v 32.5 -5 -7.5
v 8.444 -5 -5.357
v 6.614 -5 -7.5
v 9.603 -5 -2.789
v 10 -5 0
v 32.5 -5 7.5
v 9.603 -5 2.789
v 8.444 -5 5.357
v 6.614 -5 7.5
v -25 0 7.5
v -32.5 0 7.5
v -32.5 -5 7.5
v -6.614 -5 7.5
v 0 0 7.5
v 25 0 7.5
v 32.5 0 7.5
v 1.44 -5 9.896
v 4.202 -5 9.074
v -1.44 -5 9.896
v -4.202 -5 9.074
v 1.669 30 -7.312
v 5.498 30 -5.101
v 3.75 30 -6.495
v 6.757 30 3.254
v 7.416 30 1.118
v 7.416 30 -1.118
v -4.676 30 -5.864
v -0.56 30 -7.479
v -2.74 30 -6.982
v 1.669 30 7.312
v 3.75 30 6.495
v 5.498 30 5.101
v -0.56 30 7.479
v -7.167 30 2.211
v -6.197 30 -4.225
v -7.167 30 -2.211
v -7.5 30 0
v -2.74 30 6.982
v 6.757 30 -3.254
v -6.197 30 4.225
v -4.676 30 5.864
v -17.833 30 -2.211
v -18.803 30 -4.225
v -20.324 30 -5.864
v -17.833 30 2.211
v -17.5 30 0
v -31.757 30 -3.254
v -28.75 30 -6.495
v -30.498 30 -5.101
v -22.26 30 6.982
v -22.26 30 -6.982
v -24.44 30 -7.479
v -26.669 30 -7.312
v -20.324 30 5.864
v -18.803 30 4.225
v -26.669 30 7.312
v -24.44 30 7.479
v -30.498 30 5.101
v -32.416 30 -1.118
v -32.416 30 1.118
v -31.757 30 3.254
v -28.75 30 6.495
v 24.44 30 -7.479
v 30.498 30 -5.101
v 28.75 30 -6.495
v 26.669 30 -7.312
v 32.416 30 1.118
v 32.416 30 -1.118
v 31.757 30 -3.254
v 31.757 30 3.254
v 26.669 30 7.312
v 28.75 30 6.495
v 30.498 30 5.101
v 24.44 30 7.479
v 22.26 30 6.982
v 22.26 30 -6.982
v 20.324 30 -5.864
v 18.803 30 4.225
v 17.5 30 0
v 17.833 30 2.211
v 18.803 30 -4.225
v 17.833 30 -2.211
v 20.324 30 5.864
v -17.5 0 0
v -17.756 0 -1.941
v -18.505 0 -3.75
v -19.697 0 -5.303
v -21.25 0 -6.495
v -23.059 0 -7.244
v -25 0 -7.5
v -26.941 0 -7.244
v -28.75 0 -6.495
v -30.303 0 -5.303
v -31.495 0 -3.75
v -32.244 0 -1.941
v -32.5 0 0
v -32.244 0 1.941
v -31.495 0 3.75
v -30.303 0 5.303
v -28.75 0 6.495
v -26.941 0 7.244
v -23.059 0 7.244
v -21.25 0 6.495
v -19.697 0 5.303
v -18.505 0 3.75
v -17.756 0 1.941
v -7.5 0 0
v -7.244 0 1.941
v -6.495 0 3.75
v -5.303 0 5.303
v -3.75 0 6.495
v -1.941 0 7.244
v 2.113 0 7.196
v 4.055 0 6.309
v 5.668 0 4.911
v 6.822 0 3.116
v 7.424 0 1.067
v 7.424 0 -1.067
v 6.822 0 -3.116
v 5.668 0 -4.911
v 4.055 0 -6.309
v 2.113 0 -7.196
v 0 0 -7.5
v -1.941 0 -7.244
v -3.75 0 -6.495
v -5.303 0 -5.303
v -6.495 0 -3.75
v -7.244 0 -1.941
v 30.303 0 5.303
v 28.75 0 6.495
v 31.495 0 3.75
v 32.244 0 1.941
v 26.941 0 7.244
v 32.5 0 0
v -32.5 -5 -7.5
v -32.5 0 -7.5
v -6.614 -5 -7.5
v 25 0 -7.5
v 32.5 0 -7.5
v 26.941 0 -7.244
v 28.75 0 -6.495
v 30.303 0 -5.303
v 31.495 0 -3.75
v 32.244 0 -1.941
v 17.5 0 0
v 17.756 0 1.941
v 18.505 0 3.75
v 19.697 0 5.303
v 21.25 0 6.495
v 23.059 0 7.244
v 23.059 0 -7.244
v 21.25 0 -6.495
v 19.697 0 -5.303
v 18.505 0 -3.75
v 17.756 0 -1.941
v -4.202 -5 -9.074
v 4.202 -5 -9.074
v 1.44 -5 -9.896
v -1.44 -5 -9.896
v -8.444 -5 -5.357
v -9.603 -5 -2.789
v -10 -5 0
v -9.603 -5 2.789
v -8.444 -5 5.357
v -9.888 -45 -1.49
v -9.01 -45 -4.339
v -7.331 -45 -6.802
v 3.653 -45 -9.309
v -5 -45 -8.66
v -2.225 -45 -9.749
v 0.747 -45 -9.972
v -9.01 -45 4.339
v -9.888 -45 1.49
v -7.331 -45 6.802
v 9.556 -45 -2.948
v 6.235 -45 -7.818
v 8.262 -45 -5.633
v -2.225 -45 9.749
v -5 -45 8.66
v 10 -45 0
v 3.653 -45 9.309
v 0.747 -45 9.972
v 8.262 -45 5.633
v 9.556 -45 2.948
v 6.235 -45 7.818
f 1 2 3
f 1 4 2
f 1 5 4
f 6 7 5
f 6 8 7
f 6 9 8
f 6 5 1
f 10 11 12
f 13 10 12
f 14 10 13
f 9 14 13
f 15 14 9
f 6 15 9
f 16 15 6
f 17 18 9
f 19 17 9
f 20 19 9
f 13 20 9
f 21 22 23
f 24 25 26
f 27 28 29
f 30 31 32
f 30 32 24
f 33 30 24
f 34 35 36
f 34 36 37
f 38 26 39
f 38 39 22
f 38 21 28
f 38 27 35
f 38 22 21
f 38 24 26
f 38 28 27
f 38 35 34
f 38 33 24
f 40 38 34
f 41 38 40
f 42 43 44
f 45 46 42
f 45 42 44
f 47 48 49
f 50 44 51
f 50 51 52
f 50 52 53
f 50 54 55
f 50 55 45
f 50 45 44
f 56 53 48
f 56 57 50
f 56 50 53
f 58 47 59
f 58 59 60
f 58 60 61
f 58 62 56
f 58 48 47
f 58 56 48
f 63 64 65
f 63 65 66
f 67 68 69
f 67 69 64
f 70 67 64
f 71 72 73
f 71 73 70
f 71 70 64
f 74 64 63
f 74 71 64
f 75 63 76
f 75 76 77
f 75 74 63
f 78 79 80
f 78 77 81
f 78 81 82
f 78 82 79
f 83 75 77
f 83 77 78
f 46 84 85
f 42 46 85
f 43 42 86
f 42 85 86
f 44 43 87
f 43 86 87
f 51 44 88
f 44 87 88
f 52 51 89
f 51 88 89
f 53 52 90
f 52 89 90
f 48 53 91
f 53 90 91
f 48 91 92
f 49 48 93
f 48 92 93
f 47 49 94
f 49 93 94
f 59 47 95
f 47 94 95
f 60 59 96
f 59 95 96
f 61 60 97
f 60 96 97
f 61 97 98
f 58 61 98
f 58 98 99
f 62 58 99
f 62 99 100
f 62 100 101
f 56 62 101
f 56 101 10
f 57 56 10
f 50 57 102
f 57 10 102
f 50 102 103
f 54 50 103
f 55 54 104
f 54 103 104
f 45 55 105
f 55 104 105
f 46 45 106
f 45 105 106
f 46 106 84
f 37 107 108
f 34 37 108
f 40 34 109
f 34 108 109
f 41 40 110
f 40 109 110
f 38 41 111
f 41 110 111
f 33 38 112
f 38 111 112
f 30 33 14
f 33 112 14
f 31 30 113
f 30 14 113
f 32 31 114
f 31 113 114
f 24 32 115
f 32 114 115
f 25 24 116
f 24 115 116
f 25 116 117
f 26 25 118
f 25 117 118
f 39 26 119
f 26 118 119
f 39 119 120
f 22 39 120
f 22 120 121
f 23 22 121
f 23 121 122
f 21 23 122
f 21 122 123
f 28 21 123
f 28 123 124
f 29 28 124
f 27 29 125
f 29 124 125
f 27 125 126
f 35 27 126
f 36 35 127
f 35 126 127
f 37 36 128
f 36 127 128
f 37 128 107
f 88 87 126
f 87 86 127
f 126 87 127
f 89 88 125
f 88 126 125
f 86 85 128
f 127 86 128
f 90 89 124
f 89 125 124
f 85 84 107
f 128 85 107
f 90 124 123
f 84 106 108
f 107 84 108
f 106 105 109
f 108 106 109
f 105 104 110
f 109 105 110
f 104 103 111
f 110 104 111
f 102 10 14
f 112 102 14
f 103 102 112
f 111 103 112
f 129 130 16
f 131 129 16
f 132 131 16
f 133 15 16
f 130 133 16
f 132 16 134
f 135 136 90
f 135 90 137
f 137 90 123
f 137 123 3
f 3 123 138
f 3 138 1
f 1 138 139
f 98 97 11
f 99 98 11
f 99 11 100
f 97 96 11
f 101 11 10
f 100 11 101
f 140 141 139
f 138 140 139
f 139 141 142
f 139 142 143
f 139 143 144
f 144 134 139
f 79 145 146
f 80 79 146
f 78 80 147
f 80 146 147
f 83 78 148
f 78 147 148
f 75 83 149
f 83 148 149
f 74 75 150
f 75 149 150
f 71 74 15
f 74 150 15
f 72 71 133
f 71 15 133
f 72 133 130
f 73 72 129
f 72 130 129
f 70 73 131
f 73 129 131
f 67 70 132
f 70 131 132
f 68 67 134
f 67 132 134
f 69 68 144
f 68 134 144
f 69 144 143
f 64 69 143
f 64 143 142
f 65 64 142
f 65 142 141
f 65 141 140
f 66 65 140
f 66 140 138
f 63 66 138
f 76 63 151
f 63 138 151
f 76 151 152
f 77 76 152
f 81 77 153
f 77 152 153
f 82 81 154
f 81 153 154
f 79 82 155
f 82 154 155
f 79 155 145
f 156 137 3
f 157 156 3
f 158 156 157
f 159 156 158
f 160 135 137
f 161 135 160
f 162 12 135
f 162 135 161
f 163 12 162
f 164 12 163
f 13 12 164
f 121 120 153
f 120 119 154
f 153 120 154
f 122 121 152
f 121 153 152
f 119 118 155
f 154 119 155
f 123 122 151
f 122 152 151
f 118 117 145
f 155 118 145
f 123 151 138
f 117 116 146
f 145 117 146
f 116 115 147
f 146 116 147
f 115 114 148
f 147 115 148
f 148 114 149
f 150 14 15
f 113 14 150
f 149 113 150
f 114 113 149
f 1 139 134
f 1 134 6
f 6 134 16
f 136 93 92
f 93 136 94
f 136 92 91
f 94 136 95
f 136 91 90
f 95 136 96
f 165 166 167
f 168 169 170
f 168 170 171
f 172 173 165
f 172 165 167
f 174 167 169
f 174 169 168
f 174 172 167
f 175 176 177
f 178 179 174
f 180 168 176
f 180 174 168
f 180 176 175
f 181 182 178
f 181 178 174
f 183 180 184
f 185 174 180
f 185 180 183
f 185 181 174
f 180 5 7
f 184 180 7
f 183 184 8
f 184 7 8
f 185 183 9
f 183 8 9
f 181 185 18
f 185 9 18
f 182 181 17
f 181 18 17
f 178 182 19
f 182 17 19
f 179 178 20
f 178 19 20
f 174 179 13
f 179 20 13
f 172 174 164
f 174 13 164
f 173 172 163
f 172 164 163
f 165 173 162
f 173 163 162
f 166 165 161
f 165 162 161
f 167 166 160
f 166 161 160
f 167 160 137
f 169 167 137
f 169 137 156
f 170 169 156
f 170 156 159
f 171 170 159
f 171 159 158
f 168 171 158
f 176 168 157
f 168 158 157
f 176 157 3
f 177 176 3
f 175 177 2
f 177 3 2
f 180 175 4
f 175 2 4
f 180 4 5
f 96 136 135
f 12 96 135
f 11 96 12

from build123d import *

# Parameters (mm, degrees)
F0_W     = 65
F0_H     = 15
F1_DEPTH = 5
F2_R     = 7.5
F3_DEPTH = 30
F4_R     = 10
F5_DEPTH = 40


with BuildPart() as f1:
    # F0 (on Front) → F1 (new body)
    with BuildSketch(Plane.XZ):
        Rectangle(F0_W, F0_H)
    extrude(amount=F1_DEPTH)

    # F2 (on face) → F3 (join)
    with BuildSketch(Plane(origin=(0, 0, 0), x_dir=(-1, 0, 0), z_dir=(0, 1, 0))):
        with BuildLine():
            ThreePointArc((-7.5, 0), (0, -7.5), (7.5, 0))
            ThreePointArc((7.5, 0), (0, 7.5), (-7.5, 0))
        make_face()
        with Locations((-25, 0)):
            Circle(F2_R)
        with BuildLine():
            ThreePointArc((32.5, 0), (25, 7.5), (17.5, 0))
            ThreePointArc((17.5, 0), (25, -7.5), (32.5, 0))
        make_face()
    extrude(amount=F3_DEPTH)

    # F4 (on face) → F5 (join)
    with BuildSketch(Plane.XZ.offset(5)):
        Circle(F4_R)
    extrude(amount=F5_DEPTH)


solid = f1.part
